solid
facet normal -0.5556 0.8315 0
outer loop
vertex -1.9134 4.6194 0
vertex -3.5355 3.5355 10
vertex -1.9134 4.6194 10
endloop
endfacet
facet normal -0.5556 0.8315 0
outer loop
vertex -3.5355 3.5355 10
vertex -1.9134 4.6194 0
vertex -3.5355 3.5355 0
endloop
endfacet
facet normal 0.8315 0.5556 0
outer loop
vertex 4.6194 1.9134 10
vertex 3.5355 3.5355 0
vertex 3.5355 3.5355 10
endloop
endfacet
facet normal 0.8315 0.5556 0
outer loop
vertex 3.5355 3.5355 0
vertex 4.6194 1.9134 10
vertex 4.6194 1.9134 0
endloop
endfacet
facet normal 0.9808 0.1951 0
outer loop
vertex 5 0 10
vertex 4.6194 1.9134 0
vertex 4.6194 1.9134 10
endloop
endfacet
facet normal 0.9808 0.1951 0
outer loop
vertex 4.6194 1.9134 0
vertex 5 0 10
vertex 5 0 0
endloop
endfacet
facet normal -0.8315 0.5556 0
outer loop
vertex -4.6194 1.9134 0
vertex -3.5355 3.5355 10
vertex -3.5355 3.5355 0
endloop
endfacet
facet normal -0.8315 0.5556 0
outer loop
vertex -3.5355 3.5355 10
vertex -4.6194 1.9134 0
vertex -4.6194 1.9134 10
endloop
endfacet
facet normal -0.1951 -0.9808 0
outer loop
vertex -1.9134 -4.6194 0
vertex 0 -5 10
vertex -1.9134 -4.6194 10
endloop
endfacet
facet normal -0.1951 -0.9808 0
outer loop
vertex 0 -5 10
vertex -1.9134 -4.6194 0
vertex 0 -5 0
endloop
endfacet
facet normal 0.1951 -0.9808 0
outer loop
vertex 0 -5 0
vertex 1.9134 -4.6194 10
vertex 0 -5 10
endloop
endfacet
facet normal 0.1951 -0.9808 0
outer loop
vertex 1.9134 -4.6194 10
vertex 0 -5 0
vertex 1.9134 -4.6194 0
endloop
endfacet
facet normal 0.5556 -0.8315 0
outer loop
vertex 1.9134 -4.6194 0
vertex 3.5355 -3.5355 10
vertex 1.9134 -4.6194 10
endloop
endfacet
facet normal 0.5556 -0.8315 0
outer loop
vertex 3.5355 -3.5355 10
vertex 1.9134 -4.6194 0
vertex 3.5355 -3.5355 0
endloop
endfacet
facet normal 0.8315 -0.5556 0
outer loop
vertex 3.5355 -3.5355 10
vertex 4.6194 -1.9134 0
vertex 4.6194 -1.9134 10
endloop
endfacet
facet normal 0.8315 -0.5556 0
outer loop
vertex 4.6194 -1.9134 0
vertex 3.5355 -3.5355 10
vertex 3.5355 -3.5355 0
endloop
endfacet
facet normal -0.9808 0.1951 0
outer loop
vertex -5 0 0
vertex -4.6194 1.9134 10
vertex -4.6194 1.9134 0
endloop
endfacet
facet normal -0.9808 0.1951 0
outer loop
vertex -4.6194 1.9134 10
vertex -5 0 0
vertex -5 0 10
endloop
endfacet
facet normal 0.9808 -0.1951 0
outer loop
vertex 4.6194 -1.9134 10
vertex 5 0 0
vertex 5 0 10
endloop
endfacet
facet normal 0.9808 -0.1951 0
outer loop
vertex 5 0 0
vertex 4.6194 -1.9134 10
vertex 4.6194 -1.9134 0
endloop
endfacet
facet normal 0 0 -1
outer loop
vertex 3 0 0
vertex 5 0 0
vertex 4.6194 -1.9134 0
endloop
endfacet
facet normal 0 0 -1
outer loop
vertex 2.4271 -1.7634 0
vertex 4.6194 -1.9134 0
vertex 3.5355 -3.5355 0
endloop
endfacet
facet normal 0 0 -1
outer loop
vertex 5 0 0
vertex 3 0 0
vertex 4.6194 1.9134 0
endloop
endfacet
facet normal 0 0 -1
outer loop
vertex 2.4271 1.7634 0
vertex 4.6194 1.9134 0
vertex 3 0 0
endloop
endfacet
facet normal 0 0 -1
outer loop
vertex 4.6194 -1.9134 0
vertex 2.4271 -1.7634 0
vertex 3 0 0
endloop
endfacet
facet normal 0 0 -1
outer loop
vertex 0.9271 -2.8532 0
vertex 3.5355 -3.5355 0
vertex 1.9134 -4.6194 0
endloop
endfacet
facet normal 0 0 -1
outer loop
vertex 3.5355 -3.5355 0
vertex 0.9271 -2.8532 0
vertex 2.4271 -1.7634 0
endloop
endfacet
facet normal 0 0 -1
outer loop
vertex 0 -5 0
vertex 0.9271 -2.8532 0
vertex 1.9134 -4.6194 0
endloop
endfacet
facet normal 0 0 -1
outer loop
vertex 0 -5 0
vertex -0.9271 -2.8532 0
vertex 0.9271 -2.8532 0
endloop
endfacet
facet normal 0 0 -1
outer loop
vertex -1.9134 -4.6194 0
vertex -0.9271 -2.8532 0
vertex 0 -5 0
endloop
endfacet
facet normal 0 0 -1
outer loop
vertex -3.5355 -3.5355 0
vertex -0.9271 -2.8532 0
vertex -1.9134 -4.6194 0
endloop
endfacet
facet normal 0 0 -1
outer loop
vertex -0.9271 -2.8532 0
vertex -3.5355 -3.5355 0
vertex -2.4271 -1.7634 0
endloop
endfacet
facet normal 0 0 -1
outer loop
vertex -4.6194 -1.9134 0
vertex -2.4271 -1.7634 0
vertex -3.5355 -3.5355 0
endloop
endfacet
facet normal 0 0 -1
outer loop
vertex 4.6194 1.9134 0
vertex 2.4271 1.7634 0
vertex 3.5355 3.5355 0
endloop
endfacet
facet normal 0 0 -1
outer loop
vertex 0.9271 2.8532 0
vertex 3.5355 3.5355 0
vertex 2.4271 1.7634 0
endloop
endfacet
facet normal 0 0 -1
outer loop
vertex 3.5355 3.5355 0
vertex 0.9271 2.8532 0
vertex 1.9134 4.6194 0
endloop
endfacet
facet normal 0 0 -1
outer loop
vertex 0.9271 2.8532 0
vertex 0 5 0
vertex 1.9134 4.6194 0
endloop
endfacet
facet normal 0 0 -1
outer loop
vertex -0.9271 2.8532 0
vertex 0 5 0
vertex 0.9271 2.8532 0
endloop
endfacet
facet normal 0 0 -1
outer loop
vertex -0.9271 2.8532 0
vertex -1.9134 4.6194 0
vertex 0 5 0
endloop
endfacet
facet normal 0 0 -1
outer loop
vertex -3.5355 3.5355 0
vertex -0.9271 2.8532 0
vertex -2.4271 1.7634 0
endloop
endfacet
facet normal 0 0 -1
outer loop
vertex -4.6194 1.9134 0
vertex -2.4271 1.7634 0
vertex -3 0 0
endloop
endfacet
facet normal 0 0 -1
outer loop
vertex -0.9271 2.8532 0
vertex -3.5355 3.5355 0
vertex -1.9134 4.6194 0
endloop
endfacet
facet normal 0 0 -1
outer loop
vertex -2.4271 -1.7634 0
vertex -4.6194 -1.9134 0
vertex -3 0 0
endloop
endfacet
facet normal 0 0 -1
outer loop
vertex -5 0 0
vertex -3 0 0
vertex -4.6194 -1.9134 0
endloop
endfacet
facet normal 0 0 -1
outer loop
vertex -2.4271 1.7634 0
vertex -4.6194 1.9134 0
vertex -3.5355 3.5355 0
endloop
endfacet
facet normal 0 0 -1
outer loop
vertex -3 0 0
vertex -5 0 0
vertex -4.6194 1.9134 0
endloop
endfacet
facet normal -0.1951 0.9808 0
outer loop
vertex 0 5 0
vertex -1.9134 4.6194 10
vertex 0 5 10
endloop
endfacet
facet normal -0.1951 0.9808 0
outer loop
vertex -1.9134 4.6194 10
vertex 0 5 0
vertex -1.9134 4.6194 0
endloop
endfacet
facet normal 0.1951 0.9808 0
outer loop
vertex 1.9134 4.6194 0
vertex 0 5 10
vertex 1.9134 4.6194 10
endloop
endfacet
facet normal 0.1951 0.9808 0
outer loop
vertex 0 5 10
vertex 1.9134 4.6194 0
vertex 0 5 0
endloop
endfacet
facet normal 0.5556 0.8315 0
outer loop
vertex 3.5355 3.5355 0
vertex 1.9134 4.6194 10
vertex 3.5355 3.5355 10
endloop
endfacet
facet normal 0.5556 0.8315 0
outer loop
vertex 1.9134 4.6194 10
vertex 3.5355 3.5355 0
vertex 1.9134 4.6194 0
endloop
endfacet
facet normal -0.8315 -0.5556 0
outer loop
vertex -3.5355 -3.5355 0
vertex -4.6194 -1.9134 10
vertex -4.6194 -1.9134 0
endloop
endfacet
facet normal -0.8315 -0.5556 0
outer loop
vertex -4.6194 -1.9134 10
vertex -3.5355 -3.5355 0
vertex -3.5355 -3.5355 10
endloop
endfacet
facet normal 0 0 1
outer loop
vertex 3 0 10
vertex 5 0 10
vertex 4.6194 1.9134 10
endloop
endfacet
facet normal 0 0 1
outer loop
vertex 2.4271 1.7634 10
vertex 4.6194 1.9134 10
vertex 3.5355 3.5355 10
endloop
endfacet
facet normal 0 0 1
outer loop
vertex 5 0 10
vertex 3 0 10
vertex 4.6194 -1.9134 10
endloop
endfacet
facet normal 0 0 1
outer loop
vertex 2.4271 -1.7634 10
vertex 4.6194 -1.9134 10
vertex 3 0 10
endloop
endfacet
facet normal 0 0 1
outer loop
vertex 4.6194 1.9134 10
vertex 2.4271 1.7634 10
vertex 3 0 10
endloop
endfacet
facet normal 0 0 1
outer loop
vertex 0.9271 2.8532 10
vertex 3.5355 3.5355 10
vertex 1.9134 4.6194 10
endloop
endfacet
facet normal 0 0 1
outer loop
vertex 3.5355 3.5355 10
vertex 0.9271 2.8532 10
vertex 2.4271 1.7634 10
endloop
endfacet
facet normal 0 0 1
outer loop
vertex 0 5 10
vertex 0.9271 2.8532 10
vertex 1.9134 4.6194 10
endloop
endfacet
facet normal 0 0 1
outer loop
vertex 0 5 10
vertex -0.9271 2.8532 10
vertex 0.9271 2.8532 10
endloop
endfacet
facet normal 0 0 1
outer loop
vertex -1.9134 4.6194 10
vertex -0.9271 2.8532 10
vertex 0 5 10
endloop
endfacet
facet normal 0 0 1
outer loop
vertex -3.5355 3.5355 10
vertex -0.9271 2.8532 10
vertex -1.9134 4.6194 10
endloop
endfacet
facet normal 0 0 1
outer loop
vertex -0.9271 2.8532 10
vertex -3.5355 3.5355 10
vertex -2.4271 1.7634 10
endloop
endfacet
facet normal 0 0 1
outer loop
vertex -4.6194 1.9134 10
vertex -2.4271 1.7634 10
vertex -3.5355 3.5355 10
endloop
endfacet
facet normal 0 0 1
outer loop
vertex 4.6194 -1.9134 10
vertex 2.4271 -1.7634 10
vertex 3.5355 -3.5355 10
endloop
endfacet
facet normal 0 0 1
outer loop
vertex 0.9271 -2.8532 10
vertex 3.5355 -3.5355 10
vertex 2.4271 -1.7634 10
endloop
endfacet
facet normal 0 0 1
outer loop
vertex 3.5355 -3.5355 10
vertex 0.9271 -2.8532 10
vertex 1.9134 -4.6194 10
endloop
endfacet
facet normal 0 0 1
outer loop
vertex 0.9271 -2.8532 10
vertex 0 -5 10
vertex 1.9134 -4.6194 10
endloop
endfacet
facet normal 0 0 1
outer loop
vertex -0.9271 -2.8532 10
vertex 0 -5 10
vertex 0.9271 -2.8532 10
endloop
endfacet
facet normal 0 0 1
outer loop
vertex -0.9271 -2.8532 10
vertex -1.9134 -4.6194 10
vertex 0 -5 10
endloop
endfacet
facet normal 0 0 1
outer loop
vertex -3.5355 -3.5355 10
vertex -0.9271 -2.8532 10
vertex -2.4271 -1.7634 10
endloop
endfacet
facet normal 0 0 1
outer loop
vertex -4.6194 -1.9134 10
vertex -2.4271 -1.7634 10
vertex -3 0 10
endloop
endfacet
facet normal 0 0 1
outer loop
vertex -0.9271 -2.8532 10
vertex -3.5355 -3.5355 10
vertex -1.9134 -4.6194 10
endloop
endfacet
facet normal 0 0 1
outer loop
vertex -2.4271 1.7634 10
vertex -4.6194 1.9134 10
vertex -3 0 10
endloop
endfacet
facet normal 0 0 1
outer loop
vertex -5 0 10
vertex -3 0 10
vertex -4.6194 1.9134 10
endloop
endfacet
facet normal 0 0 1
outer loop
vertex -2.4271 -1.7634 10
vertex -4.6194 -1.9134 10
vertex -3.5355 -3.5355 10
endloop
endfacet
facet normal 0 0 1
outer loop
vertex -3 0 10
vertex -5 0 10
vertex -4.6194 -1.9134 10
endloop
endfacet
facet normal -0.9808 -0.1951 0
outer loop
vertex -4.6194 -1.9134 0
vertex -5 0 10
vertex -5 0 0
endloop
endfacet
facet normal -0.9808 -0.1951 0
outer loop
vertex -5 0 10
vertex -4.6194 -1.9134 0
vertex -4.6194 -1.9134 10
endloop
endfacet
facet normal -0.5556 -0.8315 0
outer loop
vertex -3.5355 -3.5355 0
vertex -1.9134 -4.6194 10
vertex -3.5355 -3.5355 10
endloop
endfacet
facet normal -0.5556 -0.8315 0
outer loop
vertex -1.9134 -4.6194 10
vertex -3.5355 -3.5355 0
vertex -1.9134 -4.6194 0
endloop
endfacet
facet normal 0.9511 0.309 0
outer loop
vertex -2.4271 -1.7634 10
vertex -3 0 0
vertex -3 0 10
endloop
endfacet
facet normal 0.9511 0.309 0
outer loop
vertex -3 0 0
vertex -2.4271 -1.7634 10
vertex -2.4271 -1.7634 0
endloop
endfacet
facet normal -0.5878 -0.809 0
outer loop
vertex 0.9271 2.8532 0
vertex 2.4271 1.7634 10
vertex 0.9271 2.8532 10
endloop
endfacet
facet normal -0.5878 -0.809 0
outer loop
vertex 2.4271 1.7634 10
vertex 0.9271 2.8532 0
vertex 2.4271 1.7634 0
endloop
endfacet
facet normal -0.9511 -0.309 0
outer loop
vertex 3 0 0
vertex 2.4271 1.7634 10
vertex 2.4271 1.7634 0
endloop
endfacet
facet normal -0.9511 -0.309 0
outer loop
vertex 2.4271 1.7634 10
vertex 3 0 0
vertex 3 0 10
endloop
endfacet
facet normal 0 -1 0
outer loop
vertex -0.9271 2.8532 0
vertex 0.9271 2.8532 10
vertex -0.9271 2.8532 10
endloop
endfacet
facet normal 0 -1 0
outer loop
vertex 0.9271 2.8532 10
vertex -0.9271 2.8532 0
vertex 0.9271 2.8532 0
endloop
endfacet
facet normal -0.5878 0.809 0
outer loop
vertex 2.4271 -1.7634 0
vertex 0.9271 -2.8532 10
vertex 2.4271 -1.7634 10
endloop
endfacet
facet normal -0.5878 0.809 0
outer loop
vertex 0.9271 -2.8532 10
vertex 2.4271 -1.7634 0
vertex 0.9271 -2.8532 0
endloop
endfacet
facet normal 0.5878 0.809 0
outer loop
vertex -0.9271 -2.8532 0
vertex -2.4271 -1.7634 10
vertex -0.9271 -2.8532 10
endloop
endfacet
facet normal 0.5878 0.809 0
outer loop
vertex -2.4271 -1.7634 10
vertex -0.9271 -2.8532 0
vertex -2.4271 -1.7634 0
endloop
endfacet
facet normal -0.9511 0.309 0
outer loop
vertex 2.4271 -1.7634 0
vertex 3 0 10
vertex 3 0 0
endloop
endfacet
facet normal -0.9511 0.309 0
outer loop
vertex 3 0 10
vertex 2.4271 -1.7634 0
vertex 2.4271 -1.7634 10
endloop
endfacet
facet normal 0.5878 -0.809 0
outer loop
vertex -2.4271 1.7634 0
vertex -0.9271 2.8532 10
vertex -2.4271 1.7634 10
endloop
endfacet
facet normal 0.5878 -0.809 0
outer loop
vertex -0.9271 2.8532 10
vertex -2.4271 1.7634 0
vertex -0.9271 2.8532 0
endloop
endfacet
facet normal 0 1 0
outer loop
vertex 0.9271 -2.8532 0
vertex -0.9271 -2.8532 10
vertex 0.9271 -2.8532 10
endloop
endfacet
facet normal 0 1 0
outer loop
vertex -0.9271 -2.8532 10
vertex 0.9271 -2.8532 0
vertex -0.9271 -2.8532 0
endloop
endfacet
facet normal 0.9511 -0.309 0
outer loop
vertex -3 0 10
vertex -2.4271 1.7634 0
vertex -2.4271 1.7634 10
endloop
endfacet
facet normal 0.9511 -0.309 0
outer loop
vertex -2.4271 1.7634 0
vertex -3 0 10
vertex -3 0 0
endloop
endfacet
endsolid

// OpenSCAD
ScrewMount(10, 5, 3);

module ScrewMount(height, radius_out, radius_in) {
    difference() {
        cylinder(h=height, r=radius_out, center=false);
        cylinder(h=height, r=radius_in, center=false);
    }
}
